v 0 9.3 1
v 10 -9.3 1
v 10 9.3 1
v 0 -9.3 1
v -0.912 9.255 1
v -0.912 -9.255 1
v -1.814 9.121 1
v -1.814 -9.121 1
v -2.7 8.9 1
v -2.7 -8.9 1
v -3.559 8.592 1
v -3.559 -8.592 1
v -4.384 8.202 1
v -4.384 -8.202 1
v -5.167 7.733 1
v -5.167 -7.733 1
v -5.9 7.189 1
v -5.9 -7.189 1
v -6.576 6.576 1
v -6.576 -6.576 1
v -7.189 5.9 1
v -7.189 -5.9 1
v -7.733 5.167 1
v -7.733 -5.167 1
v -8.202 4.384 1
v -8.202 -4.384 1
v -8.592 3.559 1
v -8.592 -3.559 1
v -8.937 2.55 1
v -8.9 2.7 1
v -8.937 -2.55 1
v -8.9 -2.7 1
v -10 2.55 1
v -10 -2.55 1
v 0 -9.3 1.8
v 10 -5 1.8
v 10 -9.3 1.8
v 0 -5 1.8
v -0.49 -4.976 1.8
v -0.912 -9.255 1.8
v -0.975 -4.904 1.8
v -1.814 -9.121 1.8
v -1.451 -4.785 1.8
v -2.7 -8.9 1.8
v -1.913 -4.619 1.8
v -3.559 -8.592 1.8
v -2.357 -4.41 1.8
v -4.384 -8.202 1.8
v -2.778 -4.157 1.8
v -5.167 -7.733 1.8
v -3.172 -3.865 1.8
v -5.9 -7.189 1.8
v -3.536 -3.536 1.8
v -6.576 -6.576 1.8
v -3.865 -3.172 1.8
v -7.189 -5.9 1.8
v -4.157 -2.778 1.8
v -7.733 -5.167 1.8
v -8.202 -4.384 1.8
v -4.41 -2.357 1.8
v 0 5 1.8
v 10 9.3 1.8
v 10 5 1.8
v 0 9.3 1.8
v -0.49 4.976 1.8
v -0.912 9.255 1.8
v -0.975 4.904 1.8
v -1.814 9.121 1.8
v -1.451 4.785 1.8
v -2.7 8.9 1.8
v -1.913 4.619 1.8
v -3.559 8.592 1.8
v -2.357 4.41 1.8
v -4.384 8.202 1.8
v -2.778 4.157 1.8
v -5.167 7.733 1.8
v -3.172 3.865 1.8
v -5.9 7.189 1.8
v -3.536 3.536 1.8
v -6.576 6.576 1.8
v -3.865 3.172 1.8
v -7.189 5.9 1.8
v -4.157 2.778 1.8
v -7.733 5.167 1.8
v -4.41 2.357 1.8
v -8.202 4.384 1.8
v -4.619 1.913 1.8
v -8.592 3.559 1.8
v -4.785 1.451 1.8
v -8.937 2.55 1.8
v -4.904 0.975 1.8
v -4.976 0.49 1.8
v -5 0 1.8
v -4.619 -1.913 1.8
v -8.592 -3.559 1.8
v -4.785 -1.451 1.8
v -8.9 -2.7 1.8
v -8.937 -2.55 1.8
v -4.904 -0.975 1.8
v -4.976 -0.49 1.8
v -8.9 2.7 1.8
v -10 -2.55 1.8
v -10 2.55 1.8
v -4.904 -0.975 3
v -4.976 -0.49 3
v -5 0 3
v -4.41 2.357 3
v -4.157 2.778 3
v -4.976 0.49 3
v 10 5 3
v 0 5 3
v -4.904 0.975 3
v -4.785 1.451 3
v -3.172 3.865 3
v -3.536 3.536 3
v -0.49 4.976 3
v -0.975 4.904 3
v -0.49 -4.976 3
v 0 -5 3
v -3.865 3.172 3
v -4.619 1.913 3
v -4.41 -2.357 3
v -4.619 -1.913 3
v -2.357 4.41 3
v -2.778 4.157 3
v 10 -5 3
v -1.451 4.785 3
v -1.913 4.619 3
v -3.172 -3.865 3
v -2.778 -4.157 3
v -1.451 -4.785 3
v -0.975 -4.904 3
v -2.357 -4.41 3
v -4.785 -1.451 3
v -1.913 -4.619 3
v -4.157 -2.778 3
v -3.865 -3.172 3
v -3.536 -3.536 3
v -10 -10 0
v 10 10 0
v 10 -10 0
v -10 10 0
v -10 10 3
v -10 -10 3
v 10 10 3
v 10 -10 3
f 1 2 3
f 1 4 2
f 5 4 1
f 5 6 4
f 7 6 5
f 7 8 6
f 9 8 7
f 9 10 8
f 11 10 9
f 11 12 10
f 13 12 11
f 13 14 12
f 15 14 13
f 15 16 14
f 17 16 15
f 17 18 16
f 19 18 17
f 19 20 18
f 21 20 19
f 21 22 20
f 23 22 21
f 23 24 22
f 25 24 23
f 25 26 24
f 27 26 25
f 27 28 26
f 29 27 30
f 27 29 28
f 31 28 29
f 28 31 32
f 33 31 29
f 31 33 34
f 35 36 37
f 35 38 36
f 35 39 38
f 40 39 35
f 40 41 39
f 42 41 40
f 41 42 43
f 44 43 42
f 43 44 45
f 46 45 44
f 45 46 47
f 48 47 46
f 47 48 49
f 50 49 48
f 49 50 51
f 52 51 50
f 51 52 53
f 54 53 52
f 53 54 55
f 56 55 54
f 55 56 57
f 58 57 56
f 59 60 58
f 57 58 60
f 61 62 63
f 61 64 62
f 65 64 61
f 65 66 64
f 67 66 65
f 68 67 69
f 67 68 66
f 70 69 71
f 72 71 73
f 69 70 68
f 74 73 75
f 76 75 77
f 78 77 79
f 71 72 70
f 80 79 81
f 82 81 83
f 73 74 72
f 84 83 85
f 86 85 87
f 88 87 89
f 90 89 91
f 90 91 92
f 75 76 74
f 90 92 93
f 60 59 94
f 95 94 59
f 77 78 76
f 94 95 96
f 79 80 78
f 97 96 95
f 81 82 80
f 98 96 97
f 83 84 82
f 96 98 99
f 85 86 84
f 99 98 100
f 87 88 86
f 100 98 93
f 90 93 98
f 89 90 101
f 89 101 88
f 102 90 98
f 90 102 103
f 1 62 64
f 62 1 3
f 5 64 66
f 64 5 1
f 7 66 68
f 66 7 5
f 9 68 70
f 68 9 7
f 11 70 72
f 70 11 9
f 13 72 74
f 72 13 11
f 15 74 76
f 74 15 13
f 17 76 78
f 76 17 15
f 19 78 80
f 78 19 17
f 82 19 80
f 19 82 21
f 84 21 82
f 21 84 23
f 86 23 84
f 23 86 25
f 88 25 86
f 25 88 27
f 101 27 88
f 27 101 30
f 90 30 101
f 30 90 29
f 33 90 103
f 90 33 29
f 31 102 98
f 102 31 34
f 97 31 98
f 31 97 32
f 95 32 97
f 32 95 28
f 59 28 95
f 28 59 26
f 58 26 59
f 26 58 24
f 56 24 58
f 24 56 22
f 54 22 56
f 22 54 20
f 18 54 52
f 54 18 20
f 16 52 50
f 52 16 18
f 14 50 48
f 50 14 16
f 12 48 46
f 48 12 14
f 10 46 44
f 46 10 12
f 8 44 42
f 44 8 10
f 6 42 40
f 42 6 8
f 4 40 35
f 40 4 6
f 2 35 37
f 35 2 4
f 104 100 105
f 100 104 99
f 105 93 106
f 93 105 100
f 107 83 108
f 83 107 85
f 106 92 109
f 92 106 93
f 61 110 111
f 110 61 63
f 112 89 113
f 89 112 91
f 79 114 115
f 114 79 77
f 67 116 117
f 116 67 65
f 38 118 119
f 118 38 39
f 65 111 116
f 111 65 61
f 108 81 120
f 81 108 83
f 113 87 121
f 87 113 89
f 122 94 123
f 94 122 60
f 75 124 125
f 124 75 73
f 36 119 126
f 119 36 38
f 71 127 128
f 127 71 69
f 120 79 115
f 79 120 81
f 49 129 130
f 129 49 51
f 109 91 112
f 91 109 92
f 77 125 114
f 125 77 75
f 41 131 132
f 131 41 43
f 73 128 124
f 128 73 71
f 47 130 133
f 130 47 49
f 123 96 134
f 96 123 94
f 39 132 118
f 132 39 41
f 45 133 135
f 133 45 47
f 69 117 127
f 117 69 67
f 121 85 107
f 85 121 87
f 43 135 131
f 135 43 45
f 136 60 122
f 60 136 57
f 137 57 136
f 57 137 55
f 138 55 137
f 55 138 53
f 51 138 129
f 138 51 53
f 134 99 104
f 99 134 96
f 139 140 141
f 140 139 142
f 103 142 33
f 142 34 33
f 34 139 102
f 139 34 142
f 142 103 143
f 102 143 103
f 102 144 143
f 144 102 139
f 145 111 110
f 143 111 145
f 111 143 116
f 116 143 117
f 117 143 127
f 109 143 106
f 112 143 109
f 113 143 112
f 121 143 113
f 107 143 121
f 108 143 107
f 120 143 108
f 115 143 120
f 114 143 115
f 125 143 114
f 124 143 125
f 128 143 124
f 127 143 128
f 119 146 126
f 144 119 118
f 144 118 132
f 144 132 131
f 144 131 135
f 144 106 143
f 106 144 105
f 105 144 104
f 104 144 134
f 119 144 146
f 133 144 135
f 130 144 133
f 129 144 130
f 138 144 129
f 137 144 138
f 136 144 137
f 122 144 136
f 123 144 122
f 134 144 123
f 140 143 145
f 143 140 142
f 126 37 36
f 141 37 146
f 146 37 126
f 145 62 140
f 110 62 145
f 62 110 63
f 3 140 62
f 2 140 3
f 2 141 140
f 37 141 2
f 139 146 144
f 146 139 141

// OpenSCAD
$fn = 64;

lion_dia = 18.6;


module lion_contact() {
    linear_extrude(0.80)
        union() {
            hull() {
                translate([lion_dia, 0, 0])
                    circle(r = lion_dia / 2);
                circle(r = lion_dia / 2);
            }
            
            square([lion_dia * 2, 5.10], center = true);
        }
        
    linear_extrude(2.80)
        union() {
            hull() {
                translate([lion_dia + 5.0, 0, 0])
                    circle(r = 10.0 / 2);
                circle(r = 10.0 / 2);
            }
        }
}

difference() {
    linear_extrude(3)
        square([20, 20], center = true);
    translate([0, 0, 1])
        lion_contact();
}

/*
lion_battery_diameter = 18.50;
lion_battery_wall_size = 2.00;

lion_workspace = [lion_battery_diameter, 72.00];
lion_base = [lion_battery_diameter + (lion_battery_wall_size * 2), 72.00 + (lion_battery_wall_size * 2)];


module lion_enclosure(height = 25.00, base_height = 3.00) {
    ziptie_w = 4.00;

    difference() { 
        linear_extrude(height)
            square(lion_base, center = true);

    translate([0, lion_workspace[1] / 2, base_height + lion_battery_diameter / 2])
        rotate([90, 0, 00])
            linear_extrude(lion_workspace[1])
                circle(r = lion_battery_diameter / 2);

        translate([0, 0, base_height + lion_battery_diameter / 2])
            linear_extrude(height - base_height - lion_battery_diameter / 2)
                square(lion_workspace, center = true);

        translate([0, 0, height - 5.50])
            linear_extrude(2.00)
                repeat_y(6, lion_workspace[1] - (lion_battery_wall_size * 2) - ziptie_w / 2 - 10)
                    square([lion_base[0], 4.00], center = true);
    }
}

lion_enclosure();

module lion_enclosure_lid() {
    linear_extrude(2)
        square(lion_base, center = true);

    translate([0, 0, 2])
        linear_extrude(1.40)
            square([lion_workspace[0] - 0.50, lion_workspace[1] - 0.50], center = true);
}*/
